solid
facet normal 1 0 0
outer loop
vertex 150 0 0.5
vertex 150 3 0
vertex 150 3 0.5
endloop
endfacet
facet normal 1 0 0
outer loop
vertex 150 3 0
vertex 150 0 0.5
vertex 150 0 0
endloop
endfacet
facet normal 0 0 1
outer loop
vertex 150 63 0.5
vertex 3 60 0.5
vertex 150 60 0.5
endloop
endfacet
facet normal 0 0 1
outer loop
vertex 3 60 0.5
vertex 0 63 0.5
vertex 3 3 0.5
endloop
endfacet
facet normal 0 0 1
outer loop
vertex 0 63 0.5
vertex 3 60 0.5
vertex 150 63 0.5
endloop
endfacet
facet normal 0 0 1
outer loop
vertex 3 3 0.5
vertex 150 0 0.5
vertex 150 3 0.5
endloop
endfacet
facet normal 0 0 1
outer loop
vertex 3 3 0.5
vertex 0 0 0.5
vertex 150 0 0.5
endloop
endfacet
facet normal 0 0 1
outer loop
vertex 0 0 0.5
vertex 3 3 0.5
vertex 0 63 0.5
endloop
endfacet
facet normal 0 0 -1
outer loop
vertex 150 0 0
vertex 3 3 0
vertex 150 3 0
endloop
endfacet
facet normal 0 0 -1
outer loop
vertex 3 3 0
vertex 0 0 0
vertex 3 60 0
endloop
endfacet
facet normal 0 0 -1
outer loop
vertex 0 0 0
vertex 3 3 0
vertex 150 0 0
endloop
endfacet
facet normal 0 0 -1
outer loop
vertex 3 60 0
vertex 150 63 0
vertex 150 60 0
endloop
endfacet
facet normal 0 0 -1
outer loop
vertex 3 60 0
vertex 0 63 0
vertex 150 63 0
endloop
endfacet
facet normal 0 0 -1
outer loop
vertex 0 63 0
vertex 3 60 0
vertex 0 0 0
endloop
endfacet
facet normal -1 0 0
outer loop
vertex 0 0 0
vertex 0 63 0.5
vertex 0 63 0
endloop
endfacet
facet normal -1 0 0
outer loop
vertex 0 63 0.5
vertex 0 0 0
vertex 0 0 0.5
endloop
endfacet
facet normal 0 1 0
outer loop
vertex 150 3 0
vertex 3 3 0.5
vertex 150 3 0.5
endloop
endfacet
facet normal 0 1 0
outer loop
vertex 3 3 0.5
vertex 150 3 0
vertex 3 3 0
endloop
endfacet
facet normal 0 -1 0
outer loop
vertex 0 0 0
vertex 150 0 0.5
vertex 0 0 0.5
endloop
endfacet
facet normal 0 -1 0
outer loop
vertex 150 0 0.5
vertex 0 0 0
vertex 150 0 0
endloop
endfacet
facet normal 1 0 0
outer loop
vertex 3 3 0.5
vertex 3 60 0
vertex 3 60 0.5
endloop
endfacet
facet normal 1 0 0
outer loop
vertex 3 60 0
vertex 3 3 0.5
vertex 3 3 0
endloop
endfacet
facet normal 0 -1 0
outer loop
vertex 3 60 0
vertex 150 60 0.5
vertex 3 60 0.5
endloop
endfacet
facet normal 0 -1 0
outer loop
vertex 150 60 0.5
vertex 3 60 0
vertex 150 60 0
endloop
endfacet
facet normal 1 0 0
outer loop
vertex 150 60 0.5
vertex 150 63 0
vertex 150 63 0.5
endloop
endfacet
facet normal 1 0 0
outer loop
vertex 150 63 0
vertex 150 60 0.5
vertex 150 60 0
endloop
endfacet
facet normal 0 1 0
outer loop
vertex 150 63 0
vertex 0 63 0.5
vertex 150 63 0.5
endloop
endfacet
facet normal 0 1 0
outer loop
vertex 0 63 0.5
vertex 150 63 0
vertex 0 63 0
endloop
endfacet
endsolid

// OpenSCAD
module wide() {
    cube([150,3,0.5]);
}

wide();
cube([3,60,0.5]);
translate([0,60,0]) wide();
